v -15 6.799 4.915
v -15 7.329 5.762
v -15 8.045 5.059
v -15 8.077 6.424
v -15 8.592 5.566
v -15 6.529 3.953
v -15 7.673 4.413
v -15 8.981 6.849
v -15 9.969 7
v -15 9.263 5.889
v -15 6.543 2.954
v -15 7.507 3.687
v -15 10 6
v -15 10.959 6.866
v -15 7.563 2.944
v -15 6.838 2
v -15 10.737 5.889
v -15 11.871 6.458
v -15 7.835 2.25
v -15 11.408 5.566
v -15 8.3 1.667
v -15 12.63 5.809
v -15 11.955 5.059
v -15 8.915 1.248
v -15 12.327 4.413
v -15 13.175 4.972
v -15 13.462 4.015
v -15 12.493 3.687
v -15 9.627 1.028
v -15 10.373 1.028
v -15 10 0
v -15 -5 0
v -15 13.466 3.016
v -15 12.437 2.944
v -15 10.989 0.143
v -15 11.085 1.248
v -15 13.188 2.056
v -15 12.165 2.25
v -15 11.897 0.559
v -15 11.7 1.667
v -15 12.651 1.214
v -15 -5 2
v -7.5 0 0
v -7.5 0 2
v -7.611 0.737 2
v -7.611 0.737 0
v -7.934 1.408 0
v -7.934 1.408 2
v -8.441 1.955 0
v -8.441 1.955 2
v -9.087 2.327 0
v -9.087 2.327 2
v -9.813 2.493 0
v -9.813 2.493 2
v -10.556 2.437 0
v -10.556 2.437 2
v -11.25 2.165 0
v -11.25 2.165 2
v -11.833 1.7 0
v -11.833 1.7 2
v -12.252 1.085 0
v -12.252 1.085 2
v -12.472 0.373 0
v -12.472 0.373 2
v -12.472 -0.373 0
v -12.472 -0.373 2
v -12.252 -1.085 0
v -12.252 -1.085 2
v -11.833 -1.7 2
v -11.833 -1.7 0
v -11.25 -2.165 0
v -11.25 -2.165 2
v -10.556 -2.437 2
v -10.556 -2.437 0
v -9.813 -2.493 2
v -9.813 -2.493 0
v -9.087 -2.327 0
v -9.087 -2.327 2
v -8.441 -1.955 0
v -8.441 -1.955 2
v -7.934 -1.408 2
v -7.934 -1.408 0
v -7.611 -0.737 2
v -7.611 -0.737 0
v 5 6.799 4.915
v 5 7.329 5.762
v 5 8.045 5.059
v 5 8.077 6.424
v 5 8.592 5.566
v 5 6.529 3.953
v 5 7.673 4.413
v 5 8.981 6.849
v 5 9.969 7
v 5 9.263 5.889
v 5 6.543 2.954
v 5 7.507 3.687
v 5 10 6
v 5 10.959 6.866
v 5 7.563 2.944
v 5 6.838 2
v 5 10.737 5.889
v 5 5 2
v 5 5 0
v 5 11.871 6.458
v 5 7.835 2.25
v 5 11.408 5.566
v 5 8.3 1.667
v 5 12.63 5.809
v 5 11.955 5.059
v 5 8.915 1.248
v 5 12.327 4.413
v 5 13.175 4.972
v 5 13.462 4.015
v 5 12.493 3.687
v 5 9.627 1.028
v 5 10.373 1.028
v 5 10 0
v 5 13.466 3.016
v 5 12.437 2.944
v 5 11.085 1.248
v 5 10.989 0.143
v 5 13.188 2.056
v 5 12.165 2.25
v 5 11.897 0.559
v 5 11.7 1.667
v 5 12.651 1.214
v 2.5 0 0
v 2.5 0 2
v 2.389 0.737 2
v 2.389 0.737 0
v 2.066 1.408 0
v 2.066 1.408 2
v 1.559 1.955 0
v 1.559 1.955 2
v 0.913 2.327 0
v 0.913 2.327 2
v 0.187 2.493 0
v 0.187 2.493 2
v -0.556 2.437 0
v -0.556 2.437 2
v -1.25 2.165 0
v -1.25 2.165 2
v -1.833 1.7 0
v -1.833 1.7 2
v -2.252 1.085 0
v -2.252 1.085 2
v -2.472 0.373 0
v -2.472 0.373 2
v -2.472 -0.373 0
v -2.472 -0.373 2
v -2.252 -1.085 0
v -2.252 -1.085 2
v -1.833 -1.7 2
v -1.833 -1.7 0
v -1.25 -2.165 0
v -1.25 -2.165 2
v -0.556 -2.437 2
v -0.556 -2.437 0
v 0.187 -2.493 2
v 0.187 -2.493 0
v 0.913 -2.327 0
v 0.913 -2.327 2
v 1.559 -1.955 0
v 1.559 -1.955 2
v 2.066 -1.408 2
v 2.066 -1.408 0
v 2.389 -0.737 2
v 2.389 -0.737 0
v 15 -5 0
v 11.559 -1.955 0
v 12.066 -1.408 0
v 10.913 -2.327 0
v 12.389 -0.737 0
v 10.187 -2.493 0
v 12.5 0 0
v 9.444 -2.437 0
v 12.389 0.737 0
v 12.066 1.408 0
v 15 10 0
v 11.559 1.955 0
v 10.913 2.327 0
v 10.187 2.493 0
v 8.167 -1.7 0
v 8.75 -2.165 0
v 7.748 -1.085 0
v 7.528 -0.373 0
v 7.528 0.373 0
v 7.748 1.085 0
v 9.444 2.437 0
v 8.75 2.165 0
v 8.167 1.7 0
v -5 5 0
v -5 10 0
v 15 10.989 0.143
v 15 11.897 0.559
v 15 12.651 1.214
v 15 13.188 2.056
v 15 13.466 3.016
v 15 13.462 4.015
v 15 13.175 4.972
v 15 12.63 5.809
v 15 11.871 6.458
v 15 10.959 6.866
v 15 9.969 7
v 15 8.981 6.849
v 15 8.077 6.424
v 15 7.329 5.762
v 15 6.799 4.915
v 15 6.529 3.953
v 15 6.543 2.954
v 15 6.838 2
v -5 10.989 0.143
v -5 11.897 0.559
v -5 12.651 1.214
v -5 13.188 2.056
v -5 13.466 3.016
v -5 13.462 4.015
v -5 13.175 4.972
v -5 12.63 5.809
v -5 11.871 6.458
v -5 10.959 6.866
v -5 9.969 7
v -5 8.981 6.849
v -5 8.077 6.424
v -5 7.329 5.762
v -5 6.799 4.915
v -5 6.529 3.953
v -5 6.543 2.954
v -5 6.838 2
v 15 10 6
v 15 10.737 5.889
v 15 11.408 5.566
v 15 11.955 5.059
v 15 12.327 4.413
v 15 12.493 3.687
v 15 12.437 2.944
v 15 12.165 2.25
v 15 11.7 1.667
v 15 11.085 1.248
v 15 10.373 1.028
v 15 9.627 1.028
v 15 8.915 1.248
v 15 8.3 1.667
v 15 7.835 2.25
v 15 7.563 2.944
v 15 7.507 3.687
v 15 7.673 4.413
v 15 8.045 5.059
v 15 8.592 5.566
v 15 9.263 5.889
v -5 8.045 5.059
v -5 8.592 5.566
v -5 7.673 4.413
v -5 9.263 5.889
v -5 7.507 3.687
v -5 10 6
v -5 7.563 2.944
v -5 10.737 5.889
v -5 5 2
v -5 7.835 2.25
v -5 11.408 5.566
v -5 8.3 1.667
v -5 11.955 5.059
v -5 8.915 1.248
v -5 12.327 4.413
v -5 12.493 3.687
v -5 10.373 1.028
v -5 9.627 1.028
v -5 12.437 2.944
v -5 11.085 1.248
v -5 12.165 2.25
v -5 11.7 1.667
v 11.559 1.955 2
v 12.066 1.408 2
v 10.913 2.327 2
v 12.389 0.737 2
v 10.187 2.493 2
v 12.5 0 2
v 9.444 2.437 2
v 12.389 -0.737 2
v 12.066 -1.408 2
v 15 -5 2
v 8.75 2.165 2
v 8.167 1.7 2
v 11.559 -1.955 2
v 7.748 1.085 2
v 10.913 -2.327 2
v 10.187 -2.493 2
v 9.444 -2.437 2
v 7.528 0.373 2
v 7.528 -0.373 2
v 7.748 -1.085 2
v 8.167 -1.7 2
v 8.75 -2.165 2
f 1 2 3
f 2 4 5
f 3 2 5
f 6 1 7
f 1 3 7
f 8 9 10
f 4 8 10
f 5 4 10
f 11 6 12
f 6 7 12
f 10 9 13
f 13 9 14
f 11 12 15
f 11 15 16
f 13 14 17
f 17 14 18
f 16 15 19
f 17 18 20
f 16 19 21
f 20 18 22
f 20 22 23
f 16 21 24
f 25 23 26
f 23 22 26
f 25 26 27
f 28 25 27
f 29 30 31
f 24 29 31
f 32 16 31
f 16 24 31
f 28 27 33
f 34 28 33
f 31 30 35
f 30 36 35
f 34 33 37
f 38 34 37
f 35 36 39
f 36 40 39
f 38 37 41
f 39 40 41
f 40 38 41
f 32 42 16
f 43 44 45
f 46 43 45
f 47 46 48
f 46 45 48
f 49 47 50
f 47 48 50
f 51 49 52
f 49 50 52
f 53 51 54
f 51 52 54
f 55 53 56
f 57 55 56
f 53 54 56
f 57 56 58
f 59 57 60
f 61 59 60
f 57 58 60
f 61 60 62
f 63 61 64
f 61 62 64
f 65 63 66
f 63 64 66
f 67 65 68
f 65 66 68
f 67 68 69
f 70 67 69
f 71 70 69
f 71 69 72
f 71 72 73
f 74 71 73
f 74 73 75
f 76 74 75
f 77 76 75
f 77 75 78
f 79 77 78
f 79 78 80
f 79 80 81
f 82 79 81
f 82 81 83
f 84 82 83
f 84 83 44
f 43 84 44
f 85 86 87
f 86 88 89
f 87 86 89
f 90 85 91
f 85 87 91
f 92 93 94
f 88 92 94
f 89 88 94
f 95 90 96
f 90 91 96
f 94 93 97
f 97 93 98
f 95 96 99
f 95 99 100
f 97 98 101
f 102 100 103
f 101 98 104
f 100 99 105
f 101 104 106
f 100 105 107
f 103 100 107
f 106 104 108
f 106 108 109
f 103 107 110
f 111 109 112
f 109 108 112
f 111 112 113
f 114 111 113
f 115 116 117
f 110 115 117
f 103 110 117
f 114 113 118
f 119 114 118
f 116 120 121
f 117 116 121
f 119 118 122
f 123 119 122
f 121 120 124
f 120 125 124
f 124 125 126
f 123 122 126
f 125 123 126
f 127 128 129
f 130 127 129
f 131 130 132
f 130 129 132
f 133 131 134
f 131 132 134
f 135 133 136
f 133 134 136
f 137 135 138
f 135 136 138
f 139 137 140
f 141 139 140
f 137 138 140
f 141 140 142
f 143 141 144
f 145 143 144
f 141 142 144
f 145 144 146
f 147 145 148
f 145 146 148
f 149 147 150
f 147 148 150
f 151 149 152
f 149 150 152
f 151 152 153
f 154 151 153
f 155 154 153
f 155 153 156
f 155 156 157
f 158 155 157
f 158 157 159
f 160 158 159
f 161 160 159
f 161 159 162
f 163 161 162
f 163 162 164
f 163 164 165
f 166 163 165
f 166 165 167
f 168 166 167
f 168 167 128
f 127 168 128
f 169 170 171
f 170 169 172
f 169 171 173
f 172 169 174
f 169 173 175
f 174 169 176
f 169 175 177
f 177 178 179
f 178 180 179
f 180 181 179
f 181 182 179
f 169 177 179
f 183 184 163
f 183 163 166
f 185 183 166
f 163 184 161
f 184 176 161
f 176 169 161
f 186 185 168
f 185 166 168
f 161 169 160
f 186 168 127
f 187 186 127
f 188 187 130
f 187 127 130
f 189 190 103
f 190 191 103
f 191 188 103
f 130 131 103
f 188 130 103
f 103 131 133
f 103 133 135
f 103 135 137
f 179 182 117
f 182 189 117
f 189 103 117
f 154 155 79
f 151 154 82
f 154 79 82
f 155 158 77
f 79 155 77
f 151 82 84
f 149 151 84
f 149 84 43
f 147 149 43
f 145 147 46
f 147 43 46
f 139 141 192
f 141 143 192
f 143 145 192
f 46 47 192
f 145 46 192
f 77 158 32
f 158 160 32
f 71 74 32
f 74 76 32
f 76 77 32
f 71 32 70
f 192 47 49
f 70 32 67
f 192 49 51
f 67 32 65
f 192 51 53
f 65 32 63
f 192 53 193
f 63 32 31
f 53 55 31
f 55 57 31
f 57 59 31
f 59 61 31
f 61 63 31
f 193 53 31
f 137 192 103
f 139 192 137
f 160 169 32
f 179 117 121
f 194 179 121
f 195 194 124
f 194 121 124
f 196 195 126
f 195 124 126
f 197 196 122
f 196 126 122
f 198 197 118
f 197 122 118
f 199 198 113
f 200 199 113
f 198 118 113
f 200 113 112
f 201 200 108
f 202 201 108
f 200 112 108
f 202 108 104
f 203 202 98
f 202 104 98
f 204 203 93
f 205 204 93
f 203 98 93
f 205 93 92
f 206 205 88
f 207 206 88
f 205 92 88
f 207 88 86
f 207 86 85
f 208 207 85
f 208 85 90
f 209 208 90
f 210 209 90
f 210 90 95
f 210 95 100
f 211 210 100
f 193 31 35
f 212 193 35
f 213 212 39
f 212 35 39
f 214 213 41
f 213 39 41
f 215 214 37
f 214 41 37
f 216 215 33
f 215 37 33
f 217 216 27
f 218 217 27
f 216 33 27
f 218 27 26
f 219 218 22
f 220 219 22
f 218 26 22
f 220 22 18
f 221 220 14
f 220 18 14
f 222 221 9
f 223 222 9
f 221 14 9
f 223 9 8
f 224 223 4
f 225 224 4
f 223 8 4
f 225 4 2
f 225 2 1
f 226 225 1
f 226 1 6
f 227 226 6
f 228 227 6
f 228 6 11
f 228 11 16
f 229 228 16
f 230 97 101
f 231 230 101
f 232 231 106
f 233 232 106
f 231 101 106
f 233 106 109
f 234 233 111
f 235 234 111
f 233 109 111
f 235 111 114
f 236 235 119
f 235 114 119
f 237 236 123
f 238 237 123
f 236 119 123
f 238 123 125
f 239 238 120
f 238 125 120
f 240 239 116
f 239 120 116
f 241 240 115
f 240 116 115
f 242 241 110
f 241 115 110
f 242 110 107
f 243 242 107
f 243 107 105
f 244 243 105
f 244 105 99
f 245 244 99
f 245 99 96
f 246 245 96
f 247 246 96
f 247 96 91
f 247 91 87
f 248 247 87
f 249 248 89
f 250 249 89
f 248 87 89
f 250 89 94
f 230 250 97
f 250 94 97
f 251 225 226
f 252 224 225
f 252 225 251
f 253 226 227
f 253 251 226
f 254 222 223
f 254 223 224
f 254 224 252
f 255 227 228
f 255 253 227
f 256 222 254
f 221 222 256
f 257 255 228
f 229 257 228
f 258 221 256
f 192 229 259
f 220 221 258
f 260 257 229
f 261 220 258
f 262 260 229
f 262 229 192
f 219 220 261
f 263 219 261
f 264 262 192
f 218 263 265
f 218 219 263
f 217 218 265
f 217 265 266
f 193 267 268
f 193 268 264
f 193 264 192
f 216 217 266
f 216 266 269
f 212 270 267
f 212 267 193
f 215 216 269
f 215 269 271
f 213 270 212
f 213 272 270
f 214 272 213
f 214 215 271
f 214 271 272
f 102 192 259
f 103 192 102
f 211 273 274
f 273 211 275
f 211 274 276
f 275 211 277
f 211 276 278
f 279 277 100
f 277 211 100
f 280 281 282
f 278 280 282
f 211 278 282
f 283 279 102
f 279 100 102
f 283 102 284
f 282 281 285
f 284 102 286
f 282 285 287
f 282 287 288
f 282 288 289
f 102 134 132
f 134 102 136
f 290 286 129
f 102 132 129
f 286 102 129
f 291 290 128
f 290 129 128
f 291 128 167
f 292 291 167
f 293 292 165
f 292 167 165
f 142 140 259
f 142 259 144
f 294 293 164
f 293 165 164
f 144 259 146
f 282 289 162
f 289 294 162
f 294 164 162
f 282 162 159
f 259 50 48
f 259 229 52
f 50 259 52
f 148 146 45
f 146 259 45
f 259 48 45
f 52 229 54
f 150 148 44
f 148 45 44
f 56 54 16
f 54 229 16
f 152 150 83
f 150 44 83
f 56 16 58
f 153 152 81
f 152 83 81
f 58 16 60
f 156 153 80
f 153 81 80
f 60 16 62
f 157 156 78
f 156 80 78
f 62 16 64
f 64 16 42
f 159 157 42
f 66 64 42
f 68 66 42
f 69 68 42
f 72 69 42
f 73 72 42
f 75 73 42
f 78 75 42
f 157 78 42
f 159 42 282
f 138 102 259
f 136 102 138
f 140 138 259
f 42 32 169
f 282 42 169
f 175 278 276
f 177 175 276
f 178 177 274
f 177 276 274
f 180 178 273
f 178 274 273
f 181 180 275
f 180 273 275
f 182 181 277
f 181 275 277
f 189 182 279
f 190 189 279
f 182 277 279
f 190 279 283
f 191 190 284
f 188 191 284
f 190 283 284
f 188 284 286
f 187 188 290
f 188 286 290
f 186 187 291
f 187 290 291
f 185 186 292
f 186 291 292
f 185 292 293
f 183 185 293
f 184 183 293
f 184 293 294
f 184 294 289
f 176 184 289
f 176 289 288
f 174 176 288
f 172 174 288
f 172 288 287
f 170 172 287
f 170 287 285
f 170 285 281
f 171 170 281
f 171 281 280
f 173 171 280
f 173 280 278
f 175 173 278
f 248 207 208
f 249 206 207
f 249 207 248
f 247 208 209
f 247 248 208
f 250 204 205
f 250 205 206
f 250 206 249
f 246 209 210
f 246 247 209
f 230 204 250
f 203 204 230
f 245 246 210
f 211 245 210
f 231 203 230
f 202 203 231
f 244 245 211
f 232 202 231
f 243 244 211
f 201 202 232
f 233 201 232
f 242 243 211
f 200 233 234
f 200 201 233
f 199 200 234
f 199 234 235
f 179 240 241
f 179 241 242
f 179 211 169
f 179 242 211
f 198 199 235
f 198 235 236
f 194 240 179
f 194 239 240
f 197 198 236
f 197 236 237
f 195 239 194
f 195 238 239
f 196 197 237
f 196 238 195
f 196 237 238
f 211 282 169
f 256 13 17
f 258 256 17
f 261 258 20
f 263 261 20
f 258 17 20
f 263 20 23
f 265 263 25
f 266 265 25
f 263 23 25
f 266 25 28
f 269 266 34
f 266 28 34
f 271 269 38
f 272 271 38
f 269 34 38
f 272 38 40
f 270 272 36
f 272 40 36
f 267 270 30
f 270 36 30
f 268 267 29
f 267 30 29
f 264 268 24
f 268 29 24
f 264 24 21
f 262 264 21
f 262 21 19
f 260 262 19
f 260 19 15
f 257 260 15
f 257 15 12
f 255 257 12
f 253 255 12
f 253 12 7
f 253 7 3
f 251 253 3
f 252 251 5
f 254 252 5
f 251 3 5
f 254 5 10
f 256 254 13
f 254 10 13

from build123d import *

# Parameters (mm, degrees)
SKETCH1_W           = 30
SKETCH1_H           = 10
BOSS_EXTRUDE1_DEPTH = 2
SKETCH2_R           = 2.5
BOSS_EXTRUDE2_DEPTH = 10
LPATTERN1_COUNT     = 2
LPATTERN1_PITCH     = 20
SKETCH3_R           = 2.5
CUT_EXTRUDE1_DEPTH  = 10


with BuildPart() as part:
    # Sketch1 → Boss-Extrude1 (new body)
    with BuildSketch(Plane.XY):
        Rectangle(SKETCH1_W, SKETCH1_H)
    extrude(amount=BOSS_EXTRUDE1_DEPTH)

    # Sketch2 → Boss-Extrude2 (add)
    with BuildSketch(Plane.ZY.offset(15)):
        with BuildLine():
            Line((0, 5), (0, 10))
            ThreePointArc((0, 10), (6.458039892, 11.870828693), (2, 6.83772234))
            Line((2, 6.83772234), (2, 5))
            Line((2, 5), (0, 5))
        make_face()
        with Locations((3.5, 10)):
            Circle(SKETCH2_R, mode=Mode.SUBTRACT)
    boss_extrude2 = extrude(amount=-BOSS_EXTRUDE2_DEPTH)

    # LPattern1: Boss-Extrude2 ×2
    with Locations(*[(i * LPATTERN1_PITCH, 0, 0) for i in range(1, LPATTERN1_COUNT)]):
        add(boss_extrude2)

    # Sketch3 → Cut-Extrude1 (cut)
    with BuildSketch(Plane.XY.offset(2)):
        with Locations((-10, 0)):
            Circle(SKETCH3_R)
        Circle(SKETCH3_R)
        with Locations((10, 0)):
            Circle(SKETCH3_R)
    extrude(amount=-CUT_EXTRUDE1_DEPTH, mode=Mode.SUBTRACT)


solid = part.part
